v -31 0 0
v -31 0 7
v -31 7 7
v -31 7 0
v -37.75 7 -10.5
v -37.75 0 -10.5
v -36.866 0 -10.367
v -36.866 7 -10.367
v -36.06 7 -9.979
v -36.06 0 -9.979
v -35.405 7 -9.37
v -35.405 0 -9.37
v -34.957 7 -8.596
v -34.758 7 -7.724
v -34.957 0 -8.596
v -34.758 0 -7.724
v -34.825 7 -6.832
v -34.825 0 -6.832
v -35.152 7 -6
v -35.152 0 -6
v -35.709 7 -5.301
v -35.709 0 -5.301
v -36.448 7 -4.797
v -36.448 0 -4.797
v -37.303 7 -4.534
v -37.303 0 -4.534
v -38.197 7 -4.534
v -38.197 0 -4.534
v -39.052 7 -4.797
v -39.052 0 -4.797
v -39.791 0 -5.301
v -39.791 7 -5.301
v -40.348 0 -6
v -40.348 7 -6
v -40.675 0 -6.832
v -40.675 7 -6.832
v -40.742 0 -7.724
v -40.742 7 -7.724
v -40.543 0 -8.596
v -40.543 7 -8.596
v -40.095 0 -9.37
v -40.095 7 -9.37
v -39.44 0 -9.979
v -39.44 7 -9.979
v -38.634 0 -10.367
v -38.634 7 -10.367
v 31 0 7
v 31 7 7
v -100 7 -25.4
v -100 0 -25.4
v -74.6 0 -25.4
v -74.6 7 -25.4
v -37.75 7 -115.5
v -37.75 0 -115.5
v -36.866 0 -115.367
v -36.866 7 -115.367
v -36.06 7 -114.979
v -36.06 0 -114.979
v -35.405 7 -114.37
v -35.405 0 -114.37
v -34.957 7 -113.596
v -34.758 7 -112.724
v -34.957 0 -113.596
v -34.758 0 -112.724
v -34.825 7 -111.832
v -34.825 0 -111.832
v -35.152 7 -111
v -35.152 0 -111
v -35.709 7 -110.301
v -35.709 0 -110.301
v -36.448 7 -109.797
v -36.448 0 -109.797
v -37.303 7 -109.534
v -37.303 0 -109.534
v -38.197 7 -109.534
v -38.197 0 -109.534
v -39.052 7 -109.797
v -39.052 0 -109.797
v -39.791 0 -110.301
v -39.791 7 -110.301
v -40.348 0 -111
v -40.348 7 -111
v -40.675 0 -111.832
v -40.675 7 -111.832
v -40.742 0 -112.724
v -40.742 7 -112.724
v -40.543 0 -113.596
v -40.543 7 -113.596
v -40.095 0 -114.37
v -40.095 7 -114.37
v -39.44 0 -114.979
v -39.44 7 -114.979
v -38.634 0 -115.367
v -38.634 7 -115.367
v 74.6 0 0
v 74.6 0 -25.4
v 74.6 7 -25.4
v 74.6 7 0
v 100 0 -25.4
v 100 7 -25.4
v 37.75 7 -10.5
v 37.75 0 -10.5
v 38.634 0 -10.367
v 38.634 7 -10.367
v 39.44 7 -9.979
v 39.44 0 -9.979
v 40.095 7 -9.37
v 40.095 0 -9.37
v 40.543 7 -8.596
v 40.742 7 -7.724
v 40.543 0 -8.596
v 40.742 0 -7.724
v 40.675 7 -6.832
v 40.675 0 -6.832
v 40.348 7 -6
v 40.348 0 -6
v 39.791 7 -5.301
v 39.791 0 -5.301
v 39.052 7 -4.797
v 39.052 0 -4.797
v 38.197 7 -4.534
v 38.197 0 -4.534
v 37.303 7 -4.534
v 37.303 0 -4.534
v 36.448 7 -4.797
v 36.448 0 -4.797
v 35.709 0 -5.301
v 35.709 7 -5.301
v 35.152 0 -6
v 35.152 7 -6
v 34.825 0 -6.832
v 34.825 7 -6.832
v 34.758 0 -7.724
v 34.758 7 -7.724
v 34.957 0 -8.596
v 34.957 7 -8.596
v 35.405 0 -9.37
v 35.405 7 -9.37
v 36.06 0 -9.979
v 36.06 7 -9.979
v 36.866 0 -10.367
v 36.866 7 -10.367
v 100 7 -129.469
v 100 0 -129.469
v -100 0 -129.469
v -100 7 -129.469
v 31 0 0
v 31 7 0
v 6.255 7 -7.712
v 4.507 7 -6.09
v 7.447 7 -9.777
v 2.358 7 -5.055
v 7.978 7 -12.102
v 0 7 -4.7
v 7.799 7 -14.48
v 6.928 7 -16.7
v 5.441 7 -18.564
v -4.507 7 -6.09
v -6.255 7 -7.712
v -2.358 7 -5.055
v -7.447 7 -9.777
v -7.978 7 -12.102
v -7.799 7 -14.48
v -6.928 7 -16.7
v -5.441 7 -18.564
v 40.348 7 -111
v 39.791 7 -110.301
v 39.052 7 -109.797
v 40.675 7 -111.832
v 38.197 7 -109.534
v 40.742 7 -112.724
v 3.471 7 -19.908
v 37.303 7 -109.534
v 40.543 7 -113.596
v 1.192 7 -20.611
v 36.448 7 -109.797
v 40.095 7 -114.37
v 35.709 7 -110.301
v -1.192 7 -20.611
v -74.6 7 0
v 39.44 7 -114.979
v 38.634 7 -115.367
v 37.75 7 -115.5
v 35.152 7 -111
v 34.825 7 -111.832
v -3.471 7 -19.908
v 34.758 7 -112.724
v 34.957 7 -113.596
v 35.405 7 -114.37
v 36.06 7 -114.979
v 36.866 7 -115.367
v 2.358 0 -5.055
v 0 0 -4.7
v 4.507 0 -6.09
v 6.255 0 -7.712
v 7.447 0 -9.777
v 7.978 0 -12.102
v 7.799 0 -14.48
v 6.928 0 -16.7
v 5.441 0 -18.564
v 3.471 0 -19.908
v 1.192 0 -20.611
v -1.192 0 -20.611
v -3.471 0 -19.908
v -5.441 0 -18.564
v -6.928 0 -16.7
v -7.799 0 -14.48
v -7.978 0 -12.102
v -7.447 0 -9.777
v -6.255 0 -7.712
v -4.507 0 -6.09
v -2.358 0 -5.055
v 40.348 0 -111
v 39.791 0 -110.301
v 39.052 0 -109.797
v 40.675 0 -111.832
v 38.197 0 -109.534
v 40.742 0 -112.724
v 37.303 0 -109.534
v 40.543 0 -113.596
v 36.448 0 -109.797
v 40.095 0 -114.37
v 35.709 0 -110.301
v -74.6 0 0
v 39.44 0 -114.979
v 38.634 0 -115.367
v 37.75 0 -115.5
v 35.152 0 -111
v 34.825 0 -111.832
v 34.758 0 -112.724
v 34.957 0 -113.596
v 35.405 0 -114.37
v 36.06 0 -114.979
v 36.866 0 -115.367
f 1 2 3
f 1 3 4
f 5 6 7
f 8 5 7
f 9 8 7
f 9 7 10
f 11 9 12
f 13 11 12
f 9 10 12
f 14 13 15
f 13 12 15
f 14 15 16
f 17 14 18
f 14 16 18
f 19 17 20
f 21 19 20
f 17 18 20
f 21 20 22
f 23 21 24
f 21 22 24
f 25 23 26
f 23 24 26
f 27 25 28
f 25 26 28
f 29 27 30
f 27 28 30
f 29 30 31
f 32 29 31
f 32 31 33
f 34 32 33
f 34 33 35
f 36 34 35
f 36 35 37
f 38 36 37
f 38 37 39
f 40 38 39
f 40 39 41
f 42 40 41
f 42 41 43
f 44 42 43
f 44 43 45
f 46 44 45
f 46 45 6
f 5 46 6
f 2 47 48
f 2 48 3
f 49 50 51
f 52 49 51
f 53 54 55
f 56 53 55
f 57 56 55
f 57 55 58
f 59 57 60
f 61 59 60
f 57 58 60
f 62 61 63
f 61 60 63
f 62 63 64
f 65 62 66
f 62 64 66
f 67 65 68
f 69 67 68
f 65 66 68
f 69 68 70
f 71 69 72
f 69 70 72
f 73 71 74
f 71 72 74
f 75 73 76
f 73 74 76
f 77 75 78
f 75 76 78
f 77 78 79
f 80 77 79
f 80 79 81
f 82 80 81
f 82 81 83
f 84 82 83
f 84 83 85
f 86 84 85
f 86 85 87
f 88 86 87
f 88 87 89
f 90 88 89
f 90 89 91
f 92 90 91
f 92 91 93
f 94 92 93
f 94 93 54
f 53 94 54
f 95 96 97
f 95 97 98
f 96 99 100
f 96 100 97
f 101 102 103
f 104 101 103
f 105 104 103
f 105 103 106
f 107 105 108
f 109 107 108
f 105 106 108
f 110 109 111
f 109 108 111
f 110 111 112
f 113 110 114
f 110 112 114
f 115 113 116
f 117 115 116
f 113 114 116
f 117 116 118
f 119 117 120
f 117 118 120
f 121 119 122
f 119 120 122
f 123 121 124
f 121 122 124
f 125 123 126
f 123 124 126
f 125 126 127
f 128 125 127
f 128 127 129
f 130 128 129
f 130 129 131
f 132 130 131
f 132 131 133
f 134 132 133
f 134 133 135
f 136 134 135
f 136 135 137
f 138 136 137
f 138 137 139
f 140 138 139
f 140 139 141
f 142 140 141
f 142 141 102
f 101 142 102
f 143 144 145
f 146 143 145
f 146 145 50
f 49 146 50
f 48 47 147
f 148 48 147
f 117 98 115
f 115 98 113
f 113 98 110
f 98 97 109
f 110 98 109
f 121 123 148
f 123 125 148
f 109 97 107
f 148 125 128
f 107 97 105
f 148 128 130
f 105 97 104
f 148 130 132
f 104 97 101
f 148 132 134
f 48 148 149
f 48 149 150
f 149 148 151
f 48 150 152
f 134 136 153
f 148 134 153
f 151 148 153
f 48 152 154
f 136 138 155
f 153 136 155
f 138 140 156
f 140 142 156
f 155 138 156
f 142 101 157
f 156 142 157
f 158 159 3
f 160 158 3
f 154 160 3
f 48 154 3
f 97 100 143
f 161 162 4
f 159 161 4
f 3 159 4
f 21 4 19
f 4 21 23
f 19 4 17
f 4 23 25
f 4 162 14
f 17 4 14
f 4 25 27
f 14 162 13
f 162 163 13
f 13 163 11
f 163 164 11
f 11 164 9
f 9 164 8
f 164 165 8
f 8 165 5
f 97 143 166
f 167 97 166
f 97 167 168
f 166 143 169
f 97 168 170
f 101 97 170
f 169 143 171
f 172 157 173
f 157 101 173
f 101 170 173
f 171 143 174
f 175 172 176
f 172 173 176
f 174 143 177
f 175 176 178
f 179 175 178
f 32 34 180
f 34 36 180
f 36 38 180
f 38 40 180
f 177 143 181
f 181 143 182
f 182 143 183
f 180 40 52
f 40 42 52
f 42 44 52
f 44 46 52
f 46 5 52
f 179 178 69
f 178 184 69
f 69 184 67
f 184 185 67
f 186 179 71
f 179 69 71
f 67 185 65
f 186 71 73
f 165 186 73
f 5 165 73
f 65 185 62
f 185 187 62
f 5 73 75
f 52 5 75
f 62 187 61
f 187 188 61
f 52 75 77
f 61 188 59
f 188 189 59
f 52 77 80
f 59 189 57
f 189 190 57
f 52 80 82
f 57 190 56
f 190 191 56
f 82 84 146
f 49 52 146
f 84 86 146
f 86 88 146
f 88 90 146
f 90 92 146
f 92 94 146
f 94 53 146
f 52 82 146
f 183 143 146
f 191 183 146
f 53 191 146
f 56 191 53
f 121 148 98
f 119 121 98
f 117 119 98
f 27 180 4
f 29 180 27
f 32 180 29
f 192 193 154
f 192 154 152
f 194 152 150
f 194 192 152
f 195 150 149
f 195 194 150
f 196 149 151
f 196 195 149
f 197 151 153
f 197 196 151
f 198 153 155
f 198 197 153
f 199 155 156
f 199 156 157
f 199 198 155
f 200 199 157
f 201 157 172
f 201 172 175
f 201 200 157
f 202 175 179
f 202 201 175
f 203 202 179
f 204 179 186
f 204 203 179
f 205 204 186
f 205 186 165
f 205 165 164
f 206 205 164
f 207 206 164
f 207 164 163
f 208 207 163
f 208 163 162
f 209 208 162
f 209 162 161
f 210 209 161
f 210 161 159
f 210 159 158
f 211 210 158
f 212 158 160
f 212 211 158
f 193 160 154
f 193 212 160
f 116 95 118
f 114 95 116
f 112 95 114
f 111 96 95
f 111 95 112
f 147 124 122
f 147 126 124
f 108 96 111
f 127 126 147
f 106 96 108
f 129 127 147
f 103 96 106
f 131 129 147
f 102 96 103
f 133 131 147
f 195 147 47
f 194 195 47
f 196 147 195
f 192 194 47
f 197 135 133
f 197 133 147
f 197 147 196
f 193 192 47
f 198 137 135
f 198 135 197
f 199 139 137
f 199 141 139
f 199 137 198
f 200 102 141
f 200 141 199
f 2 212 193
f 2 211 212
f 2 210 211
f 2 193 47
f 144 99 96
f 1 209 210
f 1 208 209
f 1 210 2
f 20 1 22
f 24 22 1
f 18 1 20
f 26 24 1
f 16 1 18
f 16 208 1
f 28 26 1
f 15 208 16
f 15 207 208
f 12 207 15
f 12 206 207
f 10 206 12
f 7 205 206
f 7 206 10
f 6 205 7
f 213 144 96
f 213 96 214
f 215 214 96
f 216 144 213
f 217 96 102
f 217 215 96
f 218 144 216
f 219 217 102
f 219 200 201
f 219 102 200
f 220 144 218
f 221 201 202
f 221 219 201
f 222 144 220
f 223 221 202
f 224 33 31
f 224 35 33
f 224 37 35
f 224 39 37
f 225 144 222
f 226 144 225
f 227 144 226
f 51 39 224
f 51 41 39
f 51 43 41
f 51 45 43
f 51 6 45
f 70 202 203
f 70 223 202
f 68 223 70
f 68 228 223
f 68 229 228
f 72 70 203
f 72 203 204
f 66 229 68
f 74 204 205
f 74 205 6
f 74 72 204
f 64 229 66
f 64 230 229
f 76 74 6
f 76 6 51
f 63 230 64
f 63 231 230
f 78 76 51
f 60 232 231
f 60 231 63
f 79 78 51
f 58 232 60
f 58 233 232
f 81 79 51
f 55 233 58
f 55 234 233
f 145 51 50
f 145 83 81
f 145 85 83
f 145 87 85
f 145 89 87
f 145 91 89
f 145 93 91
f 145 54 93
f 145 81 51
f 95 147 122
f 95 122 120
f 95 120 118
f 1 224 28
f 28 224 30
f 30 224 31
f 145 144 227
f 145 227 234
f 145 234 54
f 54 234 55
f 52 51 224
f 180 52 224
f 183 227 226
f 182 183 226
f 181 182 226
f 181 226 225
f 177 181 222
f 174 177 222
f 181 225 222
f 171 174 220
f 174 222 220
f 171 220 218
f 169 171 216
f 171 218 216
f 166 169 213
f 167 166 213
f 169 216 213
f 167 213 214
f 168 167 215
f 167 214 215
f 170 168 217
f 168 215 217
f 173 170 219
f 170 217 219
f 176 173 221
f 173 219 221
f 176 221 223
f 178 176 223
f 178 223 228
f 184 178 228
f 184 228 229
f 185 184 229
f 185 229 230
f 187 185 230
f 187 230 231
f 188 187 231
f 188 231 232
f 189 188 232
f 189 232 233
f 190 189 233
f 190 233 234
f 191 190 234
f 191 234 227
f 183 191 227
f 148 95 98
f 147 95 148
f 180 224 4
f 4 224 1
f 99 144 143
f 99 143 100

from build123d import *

# Parameters (mm, degrees)
SKETCH1_W                = 31
SKETCH1_H                = 7
SKETCH1_W_2              = 100
SKETCH1_H_2              = 45
BOSS_EXTRUDE1_DEPTH      = 7
F_6_0_6_DIAMETER_HOLE1_D = 6


with BuildPart() as part:
    # Sketch1 → Boss-Extrude1 (new body)
    with BuildSketch(Plane(origin=(0, 0, 0), x_dir=(1, 0, 0), z_dir=(0, 1, 0))):
        with BuildLine():
            Line((-31, 0), (0, 0))
            Line((0, 0), (0, 4.7))
            ThreePointArc((0, 4.7), (-8, 12.7), (0, 20.7))
            Line((0, 20.7), (0, 84.468576745))
            Line((0, 84.468576745), (-100, 84.468576745))
            Line((-100, 84.468576745), (-100, 25.4))
            Line((-100, 25.4), (-74.6, 25.4))
            Line((-74.6, 25.4), (-74.6, 0))
            Line((-74.6, 0), (-31, 0))
        make_face()
        with Locations((-15.5, -3.5)):
            Rectangle(SKETCH1_W, SKETCH1_H)
        with Locations((-50, 106.968576745)):
            Rectangle(SKETCH1_W_2, SKETCH1_H_2)
    boss_extrude1 = extrude(amount=BOSS_EXTRUDE1_DEPTH)

    # Mirror1: Boss-Extrude1 across Right Plane
    add(boss_extrude1.mirror(Plane(origin=(0, 0, 0), x_dir=(0, 0, -1), z_dir=(1, 0, 0))))

    # Ø6.0 (6) Diameter Hole1 (through all)
    with Locations(Plane(origin=(-37.75, 7, -7.5), x_dir=(0, 0, 1), z_dir=(0, 1, 0))):
        with Locations((0, 0), (0, 75.5), (-105, 75.5), (-105, 0)):
            Hole(F_6_0_6_DIAMETER_HOLE1_D / 2)


solid = part.part
